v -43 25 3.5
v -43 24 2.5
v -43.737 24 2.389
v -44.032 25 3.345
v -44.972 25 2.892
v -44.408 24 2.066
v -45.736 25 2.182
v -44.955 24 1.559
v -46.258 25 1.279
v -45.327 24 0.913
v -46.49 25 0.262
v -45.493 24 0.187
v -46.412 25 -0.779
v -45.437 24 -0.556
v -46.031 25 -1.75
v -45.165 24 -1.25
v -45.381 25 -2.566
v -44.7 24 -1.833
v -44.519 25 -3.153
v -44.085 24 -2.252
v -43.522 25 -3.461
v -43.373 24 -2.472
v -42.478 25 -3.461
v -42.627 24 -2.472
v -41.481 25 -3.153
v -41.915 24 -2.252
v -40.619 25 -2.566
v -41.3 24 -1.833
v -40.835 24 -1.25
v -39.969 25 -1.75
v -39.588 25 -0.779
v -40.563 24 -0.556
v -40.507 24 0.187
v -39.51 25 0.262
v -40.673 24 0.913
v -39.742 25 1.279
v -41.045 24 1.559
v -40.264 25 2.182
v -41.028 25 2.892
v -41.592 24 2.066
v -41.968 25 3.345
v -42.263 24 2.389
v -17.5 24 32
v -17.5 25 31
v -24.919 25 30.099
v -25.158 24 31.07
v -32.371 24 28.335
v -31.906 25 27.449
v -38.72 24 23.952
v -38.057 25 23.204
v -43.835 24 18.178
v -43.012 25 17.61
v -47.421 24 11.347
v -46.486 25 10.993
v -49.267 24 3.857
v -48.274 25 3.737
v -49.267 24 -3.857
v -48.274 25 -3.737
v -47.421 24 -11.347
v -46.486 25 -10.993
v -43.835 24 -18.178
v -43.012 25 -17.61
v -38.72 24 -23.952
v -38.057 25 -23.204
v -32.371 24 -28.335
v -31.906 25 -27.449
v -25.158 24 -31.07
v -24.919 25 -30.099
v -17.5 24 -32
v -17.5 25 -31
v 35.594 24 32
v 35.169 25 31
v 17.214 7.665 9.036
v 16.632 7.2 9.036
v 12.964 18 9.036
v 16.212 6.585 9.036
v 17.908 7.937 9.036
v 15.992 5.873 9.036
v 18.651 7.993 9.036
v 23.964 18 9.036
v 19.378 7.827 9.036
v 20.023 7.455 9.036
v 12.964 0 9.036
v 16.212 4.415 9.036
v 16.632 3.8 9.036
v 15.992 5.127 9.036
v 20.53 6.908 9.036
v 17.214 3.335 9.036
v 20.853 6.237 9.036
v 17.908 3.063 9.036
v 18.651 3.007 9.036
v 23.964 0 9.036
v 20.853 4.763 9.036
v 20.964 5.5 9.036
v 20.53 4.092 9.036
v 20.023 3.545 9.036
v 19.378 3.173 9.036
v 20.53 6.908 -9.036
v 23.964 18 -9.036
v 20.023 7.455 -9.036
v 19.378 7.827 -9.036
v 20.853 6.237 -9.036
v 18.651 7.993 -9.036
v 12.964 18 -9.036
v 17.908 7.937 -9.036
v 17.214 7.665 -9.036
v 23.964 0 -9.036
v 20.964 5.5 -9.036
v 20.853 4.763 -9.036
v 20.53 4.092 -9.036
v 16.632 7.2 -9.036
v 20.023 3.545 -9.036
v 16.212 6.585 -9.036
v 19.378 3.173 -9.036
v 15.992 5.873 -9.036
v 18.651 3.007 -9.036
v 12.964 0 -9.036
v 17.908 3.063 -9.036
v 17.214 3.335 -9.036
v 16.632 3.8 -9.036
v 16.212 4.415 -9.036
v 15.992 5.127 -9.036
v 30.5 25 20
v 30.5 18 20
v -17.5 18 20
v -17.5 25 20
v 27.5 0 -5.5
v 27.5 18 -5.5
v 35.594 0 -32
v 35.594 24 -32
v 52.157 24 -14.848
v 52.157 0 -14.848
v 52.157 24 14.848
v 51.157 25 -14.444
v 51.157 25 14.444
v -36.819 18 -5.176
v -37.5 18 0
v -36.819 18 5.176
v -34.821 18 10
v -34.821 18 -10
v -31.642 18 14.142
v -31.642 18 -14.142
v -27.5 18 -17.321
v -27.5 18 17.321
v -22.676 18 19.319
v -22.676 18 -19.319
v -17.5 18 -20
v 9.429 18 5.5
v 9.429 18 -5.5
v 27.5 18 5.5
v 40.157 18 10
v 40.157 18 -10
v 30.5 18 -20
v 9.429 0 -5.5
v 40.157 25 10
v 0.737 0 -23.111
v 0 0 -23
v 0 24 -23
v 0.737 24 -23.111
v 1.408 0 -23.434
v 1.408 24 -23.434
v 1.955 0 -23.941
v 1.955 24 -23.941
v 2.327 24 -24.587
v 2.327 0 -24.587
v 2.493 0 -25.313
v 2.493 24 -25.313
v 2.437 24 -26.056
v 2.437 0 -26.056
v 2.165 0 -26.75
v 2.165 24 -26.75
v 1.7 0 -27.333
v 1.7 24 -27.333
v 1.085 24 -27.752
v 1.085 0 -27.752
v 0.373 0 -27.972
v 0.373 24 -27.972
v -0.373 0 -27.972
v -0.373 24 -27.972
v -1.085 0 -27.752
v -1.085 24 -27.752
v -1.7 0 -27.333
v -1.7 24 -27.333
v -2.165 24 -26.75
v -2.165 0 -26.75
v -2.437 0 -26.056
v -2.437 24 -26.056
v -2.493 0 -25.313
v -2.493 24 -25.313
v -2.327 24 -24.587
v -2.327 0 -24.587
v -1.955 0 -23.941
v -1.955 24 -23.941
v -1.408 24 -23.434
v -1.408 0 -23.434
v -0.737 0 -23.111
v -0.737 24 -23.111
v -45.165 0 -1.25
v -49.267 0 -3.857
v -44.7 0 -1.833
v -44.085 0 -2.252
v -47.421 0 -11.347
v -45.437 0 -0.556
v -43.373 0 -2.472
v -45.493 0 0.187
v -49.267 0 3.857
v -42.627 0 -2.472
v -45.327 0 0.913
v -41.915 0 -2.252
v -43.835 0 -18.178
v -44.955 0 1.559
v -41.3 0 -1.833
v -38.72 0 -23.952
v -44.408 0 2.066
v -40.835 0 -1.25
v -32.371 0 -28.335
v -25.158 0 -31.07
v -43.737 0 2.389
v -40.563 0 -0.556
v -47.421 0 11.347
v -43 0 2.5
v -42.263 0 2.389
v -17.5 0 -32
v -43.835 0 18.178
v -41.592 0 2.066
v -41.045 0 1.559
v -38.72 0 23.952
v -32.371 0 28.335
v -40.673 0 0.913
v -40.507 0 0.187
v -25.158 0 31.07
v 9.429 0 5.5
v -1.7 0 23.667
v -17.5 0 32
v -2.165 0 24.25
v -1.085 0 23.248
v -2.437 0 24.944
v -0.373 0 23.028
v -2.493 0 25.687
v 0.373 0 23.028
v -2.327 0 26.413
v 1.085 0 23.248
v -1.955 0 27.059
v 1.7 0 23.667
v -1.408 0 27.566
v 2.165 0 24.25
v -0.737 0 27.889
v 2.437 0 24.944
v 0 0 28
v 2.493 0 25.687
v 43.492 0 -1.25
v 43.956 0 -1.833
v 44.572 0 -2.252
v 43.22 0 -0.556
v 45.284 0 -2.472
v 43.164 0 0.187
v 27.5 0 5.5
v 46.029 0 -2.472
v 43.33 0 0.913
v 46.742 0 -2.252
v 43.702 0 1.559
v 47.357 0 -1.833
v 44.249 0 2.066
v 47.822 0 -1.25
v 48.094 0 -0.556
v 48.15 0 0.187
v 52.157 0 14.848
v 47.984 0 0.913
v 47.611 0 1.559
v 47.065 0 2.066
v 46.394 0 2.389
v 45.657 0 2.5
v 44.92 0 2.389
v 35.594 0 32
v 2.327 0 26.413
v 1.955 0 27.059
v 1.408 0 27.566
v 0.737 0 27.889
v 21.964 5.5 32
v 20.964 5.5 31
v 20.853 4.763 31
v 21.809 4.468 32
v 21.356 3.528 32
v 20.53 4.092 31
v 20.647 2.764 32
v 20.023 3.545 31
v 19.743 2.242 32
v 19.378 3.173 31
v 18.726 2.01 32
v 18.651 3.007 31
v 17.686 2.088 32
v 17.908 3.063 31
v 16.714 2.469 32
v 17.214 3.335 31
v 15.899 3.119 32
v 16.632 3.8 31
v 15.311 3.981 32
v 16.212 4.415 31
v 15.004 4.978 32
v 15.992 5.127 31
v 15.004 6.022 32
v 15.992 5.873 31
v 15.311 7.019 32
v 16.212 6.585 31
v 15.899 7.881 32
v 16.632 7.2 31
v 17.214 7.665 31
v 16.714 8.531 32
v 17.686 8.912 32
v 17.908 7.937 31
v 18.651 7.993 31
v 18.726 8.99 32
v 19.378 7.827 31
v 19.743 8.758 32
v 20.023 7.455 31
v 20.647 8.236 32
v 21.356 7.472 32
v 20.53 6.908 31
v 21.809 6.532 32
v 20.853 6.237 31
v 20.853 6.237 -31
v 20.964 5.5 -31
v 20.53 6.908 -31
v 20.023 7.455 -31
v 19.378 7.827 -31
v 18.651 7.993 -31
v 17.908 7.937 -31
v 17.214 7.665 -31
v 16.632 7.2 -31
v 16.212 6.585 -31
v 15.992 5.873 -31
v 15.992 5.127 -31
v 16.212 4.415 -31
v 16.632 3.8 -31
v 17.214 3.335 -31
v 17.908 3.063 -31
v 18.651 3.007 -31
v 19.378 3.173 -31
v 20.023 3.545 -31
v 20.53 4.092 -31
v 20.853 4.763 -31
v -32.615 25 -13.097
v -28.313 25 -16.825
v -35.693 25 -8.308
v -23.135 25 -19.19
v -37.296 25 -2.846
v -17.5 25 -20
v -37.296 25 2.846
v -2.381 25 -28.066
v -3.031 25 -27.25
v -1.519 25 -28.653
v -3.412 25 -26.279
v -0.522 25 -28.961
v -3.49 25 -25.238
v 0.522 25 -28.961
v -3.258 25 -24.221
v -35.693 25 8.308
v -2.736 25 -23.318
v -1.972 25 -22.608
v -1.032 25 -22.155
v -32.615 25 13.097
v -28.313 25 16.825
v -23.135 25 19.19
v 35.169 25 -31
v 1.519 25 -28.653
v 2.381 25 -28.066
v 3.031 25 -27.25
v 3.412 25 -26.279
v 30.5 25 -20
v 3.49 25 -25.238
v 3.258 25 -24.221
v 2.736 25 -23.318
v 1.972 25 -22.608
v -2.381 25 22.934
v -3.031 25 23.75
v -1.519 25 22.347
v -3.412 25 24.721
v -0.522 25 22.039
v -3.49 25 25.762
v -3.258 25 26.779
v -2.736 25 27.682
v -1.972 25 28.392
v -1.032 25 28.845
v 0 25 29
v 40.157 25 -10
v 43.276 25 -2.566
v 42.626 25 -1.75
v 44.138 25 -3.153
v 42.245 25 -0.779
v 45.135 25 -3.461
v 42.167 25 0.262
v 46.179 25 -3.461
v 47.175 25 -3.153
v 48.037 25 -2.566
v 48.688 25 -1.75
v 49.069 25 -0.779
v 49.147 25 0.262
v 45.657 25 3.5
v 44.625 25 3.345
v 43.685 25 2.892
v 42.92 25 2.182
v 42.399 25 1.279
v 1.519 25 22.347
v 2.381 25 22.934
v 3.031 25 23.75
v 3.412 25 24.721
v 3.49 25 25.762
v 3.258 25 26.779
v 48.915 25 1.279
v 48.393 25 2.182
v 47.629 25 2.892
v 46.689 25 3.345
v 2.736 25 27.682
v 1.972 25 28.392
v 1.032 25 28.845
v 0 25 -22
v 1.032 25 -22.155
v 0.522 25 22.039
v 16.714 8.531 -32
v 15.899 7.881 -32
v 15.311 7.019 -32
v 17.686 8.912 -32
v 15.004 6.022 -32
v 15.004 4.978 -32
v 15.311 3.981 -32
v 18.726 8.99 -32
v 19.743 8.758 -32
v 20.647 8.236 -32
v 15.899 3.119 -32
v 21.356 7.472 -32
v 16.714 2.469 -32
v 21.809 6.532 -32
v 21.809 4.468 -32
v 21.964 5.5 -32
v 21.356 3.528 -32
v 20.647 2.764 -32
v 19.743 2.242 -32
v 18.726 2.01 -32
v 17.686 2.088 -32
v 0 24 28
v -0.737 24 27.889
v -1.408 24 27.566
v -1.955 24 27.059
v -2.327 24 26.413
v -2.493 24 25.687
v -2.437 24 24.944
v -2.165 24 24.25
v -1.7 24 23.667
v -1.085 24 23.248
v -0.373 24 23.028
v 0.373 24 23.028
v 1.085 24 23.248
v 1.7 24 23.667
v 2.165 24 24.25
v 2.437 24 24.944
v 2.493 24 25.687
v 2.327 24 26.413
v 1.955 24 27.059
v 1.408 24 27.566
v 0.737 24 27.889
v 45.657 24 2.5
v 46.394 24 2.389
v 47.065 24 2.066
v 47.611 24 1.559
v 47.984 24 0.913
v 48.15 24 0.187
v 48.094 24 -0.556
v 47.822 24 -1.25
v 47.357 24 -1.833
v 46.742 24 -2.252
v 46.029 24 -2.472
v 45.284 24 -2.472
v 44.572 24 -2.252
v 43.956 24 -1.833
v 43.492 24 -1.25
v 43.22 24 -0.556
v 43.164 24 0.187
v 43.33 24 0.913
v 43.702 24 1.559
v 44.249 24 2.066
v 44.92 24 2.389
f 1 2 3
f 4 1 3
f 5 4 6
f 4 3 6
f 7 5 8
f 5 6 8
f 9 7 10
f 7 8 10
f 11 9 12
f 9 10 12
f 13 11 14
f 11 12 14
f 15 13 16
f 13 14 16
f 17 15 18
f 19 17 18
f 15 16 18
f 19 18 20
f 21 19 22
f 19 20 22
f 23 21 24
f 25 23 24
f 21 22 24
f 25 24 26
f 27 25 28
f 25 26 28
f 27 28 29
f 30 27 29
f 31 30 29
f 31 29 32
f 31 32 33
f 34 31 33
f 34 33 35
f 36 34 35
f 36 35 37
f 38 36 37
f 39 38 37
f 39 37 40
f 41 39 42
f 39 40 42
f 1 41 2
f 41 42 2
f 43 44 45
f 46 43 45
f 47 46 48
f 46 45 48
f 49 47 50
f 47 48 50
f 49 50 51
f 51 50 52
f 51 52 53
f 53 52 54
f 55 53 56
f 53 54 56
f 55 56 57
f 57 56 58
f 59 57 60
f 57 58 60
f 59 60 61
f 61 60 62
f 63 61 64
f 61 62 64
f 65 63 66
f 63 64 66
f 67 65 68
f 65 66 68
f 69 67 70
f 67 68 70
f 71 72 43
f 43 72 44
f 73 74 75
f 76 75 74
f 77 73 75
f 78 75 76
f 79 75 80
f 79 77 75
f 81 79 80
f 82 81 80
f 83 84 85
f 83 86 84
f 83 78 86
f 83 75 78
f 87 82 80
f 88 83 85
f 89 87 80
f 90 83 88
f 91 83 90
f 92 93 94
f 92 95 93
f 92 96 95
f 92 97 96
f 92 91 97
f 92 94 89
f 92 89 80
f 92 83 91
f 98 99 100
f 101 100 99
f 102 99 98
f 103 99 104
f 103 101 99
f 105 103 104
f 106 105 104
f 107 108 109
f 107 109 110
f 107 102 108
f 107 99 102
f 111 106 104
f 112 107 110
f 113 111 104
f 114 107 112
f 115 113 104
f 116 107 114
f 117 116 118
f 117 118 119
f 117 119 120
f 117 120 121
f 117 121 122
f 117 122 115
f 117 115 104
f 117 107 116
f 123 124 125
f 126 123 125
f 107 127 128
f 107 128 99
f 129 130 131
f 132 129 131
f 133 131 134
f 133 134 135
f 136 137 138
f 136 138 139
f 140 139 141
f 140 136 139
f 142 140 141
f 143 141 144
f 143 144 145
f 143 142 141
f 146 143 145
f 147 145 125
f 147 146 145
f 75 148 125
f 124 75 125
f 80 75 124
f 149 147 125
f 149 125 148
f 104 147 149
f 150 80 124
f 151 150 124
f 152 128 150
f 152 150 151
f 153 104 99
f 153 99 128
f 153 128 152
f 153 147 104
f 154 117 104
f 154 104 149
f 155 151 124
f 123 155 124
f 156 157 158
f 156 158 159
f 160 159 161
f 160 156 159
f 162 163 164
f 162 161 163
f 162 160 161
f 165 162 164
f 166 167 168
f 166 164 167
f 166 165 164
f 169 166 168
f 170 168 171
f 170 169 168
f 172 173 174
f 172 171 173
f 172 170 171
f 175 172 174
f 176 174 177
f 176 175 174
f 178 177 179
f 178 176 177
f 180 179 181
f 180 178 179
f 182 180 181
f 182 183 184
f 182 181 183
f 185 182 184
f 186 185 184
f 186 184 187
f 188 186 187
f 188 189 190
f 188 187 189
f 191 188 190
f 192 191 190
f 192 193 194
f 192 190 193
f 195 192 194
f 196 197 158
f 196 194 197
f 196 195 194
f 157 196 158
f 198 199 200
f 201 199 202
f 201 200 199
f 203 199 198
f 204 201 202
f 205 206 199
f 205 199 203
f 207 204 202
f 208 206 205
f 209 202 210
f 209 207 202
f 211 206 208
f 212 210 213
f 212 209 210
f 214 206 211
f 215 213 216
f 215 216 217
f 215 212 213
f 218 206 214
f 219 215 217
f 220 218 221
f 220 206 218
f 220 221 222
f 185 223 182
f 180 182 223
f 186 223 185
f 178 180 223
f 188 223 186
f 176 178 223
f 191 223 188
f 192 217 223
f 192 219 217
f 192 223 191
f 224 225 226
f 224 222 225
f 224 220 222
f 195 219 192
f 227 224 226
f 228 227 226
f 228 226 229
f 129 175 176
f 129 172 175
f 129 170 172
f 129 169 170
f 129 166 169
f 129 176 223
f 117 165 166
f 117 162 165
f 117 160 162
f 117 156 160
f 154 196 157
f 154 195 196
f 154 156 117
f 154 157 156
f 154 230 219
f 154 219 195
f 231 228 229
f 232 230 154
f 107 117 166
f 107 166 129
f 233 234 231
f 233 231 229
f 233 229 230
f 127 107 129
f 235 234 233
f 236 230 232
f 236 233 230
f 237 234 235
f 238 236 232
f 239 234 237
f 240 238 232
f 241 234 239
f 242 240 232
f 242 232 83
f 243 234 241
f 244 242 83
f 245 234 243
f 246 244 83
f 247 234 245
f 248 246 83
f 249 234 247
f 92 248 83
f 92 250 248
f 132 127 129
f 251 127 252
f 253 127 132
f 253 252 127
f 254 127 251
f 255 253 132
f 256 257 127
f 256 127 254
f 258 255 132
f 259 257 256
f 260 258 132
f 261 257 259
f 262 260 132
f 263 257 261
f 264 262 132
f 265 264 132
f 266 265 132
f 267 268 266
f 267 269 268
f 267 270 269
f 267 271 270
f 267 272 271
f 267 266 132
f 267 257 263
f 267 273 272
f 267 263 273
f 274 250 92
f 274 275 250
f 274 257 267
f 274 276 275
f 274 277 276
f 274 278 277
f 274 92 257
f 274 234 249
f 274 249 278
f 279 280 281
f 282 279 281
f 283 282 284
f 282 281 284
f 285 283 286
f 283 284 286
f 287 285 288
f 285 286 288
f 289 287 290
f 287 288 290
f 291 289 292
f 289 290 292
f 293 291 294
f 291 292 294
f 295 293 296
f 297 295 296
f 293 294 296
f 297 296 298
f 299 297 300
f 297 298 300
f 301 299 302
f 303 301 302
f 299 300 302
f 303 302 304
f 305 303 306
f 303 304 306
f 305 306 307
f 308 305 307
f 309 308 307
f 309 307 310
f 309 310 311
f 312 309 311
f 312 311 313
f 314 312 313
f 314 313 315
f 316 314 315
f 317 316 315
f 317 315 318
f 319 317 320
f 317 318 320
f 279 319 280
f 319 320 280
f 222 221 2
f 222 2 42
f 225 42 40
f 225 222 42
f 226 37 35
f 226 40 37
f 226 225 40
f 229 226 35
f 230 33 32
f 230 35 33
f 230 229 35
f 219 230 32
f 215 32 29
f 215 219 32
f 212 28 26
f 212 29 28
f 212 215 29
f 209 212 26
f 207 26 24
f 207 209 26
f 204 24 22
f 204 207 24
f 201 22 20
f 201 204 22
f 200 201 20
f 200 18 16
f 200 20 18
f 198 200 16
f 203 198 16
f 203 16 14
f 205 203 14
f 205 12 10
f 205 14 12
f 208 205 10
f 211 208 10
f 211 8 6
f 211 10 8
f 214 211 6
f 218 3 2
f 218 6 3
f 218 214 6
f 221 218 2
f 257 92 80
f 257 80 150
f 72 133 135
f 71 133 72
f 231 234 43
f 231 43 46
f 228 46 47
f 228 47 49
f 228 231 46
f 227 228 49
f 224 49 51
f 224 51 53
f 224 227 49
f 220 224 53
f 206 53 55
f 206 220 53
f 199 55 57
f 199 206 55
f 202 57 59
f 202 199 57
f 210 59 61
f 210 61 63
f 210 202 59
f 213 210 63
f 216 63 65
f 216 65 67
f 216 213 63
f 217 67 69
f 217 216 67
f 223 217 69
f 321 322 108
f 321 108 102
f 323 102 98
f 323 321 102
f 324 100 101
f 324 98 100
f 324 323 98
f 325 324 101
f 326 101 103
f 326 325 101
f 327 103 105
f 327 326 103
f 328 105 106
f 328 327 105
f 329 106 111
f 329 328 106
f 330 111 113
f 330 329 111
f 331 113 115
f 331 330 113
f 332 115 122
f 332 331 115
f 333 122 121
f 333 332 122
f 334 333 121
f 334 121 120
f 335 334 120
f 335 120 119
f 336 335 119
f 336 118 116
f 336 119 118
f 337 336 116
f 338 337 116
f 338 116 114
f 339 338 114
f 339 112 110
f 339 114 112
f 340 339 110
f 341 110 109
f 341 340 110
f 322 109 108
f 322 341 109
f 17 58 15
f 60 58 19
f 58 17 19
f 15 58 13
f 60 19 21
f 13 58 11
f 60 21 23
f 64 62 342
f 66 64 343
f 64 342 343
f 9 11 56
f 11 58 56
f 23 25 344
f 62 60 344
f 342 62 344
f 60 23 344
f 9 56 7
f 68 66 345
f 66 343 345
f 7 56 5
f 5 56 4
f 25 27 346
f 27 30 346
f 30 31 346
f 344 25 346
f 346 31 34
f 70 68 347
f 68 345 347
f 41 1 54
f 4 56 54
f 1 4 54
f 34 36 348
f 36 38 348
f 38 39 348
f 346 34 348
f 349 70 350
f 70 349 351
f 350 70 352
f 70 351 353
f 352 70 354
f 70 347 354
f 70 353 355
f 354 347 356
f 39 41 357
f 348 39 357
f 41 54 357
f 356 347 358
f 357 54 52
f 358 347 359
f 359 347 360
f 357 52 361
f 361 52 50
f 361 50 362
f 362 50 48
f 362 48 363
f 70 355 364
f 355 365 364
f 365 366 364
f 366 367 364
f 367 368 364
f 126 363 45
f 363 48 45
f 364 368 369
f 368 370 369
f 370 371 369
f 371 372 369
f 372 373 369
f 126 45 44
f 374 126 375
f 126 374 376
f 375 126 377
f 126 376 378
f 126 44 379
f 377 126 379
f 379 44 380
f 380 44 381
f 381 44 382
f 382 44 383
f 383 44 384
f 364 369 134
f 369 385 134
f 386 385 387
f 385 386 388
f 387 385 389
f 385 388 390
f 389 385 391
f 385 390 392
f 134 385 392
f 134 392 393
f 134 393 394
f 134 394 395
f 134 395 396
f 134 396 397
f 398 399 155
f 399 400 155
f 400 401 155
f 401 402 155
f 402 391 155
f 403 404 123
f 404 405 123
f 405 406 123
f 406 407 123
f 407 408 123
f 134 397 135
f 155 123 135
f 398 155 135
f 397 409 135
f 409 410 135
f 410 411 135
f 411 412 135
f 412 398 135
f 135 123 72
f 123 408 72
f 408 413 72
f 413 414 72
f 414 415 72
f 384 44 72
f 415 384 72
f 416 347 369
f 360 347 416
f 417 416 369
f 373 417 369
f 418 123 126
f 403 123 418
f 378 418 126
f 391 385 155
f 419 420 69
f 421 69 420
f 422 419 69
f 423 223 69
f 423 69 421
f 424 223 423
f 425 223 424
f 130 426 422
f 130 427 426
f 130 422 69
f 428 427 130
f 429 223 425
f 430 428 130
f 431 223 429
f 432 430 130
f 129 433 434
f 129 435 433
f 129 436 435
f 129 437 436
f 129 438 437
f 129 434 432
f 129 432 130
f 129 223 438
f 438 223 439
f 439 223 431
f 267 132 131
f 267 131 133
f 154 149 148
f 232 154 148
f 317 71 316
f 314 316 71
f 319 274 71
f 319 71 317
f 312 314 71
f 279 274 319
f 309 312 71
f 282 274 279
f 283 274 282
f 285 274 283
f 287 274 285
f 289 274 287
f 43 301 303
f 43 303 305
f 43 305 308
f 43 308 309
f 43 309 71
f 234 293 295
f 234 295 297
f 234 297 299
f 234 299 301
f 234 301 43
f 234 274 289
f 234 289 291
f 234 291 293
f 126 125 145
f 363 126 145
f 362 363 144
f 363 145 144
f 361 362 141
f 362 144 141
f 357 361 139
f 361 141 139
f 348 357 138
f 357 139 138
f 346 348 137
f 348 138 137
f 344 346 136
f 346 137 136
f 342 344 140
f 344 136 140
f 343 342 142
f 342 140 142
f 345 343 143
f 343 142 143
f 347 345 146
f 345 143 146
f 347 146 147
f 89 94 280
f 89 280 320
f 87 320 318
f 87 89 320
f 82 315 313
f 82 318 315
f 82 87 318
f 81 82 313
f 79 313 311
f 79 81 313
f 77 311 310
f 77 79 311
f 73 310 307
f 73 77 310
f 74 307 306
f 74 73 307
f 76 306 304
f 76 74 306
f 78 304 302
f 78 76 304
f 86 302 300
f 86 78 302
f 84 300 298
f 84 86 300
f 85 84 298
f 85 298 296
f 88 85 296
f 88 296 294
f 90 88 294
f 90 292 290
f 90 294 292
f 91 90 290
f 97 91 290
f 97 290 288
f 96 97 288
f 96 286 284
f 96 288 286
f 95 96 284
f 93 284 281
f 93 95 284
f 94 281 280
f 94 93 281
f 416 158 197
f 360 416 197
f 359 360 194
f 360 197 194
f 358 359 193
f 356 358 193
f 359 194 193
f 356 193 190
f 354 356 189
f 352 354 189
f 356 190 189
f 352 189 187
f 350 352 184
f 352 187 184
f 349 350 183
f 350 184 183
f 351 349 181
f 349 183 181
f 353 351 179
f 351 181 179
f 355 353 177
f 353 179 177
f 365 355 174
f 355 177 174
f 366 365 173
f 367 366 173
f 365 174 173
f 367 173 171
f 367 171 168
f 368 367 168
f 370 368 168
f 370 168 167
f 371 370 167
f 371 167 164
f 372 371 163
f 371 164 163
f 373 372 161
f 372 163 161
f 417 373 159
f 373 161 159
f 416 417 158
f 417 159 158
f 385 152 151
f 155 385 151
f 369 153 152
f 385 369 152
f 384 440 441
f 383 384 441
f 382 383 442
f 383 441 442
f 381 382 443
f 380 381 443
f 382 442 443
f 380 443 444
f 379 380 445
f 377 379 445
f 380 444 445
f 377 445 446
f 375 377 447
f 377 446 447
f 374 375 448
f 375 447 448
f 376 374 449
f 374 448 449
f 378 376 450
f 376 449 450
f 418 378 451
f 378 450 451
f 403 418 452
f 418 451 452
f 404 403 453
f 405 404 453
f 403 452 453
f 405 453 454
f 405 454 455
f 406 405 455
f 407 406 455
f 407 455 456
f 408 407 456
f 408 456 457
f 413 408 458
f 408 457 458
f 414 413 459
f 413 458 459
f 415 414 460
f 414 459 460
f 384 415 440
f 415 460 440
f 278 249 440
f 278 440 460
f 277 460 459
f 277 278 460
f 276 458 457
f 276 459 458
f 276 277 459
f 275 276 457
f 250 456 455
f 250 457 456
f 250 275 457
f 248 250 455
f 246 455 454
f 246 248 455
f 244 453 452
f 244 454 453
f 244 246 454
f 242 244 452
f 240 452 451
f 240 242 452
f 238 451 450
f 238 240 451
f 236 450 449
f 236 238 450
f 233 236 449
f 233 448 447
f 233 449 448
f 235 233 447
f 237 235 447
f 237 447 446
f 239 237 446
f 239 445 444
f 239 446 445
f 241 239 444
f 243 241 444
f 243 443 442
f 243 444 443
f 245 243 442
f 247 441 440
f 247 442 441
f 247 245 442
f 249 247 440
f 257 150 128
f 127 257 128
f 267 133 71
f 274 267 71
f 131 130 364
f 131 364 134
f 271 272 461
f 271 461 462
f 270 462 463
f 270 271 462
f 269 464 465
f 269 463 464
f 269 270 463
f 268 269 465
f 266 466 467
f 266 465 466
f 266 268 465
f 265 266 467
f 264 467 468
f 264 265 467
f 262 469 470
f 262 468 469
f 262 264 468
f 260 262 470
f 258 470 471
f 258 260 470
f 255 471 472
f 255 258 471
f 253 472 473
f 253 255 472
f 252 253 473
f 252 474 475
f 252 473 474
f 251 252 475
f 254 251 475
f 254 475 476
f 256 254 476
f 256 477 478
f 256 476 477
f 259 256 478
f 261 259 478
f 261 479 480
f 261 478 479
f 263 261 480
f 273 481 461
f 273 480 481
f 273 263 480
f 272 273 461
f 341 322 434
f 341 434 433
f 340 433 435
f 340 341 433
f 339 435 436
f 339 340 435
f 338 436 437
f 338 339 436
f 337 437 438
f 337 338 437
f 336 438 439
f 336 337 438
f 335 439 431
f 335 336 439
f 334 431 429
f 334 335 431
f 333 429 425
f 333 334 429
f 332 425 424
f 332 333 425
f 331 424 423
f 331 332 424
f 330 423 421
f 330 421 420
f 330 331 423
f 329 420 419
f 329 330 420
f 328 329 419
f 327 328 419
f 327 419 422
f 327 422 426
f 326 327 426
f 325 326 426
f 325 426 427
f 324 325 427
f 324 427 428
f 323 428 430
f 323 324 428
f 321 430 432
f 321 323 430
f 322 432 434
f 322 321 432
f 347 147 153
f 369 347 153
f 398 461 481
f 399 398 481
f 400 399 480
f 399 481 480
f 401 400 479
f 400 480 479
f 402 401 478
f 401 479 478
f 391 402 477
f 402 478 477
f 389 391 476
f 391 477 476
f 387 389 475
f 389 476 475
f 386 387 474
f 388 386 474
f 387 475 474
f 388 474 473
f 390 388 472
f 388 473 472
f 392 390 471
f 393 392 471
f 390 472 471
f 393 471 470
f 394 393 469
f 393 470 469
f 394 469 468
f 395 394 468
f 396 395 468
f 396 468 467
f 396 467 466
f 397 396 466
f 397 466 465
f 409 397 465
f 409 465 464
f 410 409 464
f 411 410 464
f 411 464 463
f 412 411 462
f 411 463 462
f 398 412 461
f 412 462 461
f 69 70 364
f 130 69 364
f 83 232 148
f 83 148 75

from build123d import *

# Parameters (mm, degrees)
BOSS_EXTRUDE1_DEPTH     = 18
CUT_EXTRUDE1_DEPTH      = 18
EXTRUDE_THIN1_DEPTH     = 25
CUT_EXTRUDE2_DEPTH      = 78.777509214
CUT_EXTRUDE2_DEPTH_BACK = 78.777509214
SKETCH3_R               = 2.5
CHAMFER1_SIZE           = 1
CUT_EXTRUDE3_DEPTH      = 67.100990458
CUT_EXTRUDE3_DEPTH_BACK = 67.100990458
SKETCH6_R               = 2.5
CHAMFER3_SIZE           = 1


with BuildPart() as part:
    # Sketch1 → Boss-Extrude1 (new body)
    with BuildSketch(Plane(origin=(0, 0, 0), x_dir=(1, 0, 0), z_dir=(0, 1, 0))):
        with BuildLine():
            Line((40.156887748, -10), (40.156887748, 10))
            Line((40.156887748, 10), (30.5, 20))
            Line((30.5, 20), (-17.5, 20))
            ThreePointArc((-17.5, 20), (-31.64213568, 14.142135567), (-37.5, -1.6e-07))
            ThreePointArc((-37.5, -1.6e-07), (-31.642135567, -14.14213568), (-17.5, -20))
            Line((-17.5, -20), (30.5, -20))
            Line((30.5, -20), (40.156887748, -10))
        make_face()
    extrude(amount=BOSS_EXTRUDE1_DEPTH)

    # Sketch2 → Cut-Extrude1 (cut)
    with BuildSketch(Plane.XZ):
        Polygon((27.5, 5.5), (27.5, -5.5), (23.964466094, -9.035533906), (12.964466094, -9.035533906), (9.428932188, -5.5), (9.428932188, 5.5), (12.964466094, 9.035533906), (23.964466094, 9.035533906), align=None)
    extrude(amount=-CUT_EXTRUDE1_DEPTH, mode=Mode.SUBTRACT)

    # Sketch4 → Extrude-Thin1 (add)
    with BuildSketch(Plane.XZ):
        with BuildLine():
            Line((-17.5, -32), (35.593697795, -32))
            Line((35.593697795, -32), (52.156887748, -14.84831471))
            Line((52.156887748, -14.84831471), (52.156887748, 14.84831471))
            Line((52.156887748, 14.84831471), (35.593697795, 32))
            Line((35.593697795, 32), (-17.5, 32))
            ThreePointArc((-17.5, 32), (-49.5, 0), (-17.5, -32))
        make_face()
        with BuildLine():
            Line((-17.5, -20), (30.5, -20))
            Line((30.5, -20), (40.156887748, -10))
            Line((40.156887748, -10), (40.156887748, 10))
            Line((40.156887748, 10), (30.5, 20))
            Line((30.5, 20), (-17.5, 20))
            ThreePointArc((-17.5, 20), (-37.5, 0), (-17.5, -20))
        make_face(mode=Mode.SUBTRACT)
    extrude(amount=-EXTRUDE_THIN1_DEPTH)

    # Sketch3 → Cut-Extrude2 (cut, two sides: drawn at the far end of the back side and taken through both)
    with BuildSketch(Plane.XY.offset(20).offset(-CUT_EXTRUDE2_DEPTH_BACK)):
        with Locations((18.464466094, 5.5)):
            Circle(SKETCH3_R)
    extrude(amount=CUT_EXTRUDE2_DEPTH + CUT_EXTRUDE2_DEPTH_BACK, mode=Mode.SUBTRACT)

    # Chamfer1
    chamfer1_edges = [part.edges().sort_by_distance(p)[0] for p in [
        (-49.5, 25, 0),
        (9.046848897, 25, 32),
        (43.875292771, 25, 23.424157355),
        (52.156887748, 25, 0),
        (43.875292771, 25, -23.424157355),
        (9.046848897, 25, -32),
        (15.964466094, 5.5, -32),
        (15.964466094, 5.5, 32),
    ]]
    chamfer(chamfer1_edges, length=CHAMFER1_SIZE)

    # Sketch6 → Cut-Extrude3 (cut, two sides: drawn at the far end of the back side and taken through both)
    with BuildSketch(Plane(origin=(0, 25, 0), x_dir=(1, 0, 0), z_dir=(0, 1, 0)).offset(-CUT_EXTRUDE3_DEPTH_BACK)):
        with Locations(Location((0, 25.5, 0), (0, 0, 270))):
            Circle(SKETCH6_R)
        with Locations(Location((0, -25.5, 0), (0, 0, 270))):
            Circle(SKETCH6_R)
        with Locations(Location((45.656887748, 0, 0), (0, 0, 270))):
            Circle(SKETCH6_R)
        with Locations(Location((-43, 0, 0), (0, 0, 270))):
            Circle(SKETCH6_R)
    extrude(amount=CUT_EXTRUDE3_DEPTH + CUT_EXTRUDE3_DEPTH_BACK, mode=Mode.SUBTRACT)

    # Chamfer3
    chamfer3_edges = [part.edges().sort_by_distance(p)[0] for p in [
        (0, 25, -28),
        (0, 25, 23),
        (45.656887748, 25, -2.5),
        (-43, 25, -2.5),
    ]]
    chamfer(chamfer3_edges, length=CHAMFER3_SIZE)


solid = part.part
